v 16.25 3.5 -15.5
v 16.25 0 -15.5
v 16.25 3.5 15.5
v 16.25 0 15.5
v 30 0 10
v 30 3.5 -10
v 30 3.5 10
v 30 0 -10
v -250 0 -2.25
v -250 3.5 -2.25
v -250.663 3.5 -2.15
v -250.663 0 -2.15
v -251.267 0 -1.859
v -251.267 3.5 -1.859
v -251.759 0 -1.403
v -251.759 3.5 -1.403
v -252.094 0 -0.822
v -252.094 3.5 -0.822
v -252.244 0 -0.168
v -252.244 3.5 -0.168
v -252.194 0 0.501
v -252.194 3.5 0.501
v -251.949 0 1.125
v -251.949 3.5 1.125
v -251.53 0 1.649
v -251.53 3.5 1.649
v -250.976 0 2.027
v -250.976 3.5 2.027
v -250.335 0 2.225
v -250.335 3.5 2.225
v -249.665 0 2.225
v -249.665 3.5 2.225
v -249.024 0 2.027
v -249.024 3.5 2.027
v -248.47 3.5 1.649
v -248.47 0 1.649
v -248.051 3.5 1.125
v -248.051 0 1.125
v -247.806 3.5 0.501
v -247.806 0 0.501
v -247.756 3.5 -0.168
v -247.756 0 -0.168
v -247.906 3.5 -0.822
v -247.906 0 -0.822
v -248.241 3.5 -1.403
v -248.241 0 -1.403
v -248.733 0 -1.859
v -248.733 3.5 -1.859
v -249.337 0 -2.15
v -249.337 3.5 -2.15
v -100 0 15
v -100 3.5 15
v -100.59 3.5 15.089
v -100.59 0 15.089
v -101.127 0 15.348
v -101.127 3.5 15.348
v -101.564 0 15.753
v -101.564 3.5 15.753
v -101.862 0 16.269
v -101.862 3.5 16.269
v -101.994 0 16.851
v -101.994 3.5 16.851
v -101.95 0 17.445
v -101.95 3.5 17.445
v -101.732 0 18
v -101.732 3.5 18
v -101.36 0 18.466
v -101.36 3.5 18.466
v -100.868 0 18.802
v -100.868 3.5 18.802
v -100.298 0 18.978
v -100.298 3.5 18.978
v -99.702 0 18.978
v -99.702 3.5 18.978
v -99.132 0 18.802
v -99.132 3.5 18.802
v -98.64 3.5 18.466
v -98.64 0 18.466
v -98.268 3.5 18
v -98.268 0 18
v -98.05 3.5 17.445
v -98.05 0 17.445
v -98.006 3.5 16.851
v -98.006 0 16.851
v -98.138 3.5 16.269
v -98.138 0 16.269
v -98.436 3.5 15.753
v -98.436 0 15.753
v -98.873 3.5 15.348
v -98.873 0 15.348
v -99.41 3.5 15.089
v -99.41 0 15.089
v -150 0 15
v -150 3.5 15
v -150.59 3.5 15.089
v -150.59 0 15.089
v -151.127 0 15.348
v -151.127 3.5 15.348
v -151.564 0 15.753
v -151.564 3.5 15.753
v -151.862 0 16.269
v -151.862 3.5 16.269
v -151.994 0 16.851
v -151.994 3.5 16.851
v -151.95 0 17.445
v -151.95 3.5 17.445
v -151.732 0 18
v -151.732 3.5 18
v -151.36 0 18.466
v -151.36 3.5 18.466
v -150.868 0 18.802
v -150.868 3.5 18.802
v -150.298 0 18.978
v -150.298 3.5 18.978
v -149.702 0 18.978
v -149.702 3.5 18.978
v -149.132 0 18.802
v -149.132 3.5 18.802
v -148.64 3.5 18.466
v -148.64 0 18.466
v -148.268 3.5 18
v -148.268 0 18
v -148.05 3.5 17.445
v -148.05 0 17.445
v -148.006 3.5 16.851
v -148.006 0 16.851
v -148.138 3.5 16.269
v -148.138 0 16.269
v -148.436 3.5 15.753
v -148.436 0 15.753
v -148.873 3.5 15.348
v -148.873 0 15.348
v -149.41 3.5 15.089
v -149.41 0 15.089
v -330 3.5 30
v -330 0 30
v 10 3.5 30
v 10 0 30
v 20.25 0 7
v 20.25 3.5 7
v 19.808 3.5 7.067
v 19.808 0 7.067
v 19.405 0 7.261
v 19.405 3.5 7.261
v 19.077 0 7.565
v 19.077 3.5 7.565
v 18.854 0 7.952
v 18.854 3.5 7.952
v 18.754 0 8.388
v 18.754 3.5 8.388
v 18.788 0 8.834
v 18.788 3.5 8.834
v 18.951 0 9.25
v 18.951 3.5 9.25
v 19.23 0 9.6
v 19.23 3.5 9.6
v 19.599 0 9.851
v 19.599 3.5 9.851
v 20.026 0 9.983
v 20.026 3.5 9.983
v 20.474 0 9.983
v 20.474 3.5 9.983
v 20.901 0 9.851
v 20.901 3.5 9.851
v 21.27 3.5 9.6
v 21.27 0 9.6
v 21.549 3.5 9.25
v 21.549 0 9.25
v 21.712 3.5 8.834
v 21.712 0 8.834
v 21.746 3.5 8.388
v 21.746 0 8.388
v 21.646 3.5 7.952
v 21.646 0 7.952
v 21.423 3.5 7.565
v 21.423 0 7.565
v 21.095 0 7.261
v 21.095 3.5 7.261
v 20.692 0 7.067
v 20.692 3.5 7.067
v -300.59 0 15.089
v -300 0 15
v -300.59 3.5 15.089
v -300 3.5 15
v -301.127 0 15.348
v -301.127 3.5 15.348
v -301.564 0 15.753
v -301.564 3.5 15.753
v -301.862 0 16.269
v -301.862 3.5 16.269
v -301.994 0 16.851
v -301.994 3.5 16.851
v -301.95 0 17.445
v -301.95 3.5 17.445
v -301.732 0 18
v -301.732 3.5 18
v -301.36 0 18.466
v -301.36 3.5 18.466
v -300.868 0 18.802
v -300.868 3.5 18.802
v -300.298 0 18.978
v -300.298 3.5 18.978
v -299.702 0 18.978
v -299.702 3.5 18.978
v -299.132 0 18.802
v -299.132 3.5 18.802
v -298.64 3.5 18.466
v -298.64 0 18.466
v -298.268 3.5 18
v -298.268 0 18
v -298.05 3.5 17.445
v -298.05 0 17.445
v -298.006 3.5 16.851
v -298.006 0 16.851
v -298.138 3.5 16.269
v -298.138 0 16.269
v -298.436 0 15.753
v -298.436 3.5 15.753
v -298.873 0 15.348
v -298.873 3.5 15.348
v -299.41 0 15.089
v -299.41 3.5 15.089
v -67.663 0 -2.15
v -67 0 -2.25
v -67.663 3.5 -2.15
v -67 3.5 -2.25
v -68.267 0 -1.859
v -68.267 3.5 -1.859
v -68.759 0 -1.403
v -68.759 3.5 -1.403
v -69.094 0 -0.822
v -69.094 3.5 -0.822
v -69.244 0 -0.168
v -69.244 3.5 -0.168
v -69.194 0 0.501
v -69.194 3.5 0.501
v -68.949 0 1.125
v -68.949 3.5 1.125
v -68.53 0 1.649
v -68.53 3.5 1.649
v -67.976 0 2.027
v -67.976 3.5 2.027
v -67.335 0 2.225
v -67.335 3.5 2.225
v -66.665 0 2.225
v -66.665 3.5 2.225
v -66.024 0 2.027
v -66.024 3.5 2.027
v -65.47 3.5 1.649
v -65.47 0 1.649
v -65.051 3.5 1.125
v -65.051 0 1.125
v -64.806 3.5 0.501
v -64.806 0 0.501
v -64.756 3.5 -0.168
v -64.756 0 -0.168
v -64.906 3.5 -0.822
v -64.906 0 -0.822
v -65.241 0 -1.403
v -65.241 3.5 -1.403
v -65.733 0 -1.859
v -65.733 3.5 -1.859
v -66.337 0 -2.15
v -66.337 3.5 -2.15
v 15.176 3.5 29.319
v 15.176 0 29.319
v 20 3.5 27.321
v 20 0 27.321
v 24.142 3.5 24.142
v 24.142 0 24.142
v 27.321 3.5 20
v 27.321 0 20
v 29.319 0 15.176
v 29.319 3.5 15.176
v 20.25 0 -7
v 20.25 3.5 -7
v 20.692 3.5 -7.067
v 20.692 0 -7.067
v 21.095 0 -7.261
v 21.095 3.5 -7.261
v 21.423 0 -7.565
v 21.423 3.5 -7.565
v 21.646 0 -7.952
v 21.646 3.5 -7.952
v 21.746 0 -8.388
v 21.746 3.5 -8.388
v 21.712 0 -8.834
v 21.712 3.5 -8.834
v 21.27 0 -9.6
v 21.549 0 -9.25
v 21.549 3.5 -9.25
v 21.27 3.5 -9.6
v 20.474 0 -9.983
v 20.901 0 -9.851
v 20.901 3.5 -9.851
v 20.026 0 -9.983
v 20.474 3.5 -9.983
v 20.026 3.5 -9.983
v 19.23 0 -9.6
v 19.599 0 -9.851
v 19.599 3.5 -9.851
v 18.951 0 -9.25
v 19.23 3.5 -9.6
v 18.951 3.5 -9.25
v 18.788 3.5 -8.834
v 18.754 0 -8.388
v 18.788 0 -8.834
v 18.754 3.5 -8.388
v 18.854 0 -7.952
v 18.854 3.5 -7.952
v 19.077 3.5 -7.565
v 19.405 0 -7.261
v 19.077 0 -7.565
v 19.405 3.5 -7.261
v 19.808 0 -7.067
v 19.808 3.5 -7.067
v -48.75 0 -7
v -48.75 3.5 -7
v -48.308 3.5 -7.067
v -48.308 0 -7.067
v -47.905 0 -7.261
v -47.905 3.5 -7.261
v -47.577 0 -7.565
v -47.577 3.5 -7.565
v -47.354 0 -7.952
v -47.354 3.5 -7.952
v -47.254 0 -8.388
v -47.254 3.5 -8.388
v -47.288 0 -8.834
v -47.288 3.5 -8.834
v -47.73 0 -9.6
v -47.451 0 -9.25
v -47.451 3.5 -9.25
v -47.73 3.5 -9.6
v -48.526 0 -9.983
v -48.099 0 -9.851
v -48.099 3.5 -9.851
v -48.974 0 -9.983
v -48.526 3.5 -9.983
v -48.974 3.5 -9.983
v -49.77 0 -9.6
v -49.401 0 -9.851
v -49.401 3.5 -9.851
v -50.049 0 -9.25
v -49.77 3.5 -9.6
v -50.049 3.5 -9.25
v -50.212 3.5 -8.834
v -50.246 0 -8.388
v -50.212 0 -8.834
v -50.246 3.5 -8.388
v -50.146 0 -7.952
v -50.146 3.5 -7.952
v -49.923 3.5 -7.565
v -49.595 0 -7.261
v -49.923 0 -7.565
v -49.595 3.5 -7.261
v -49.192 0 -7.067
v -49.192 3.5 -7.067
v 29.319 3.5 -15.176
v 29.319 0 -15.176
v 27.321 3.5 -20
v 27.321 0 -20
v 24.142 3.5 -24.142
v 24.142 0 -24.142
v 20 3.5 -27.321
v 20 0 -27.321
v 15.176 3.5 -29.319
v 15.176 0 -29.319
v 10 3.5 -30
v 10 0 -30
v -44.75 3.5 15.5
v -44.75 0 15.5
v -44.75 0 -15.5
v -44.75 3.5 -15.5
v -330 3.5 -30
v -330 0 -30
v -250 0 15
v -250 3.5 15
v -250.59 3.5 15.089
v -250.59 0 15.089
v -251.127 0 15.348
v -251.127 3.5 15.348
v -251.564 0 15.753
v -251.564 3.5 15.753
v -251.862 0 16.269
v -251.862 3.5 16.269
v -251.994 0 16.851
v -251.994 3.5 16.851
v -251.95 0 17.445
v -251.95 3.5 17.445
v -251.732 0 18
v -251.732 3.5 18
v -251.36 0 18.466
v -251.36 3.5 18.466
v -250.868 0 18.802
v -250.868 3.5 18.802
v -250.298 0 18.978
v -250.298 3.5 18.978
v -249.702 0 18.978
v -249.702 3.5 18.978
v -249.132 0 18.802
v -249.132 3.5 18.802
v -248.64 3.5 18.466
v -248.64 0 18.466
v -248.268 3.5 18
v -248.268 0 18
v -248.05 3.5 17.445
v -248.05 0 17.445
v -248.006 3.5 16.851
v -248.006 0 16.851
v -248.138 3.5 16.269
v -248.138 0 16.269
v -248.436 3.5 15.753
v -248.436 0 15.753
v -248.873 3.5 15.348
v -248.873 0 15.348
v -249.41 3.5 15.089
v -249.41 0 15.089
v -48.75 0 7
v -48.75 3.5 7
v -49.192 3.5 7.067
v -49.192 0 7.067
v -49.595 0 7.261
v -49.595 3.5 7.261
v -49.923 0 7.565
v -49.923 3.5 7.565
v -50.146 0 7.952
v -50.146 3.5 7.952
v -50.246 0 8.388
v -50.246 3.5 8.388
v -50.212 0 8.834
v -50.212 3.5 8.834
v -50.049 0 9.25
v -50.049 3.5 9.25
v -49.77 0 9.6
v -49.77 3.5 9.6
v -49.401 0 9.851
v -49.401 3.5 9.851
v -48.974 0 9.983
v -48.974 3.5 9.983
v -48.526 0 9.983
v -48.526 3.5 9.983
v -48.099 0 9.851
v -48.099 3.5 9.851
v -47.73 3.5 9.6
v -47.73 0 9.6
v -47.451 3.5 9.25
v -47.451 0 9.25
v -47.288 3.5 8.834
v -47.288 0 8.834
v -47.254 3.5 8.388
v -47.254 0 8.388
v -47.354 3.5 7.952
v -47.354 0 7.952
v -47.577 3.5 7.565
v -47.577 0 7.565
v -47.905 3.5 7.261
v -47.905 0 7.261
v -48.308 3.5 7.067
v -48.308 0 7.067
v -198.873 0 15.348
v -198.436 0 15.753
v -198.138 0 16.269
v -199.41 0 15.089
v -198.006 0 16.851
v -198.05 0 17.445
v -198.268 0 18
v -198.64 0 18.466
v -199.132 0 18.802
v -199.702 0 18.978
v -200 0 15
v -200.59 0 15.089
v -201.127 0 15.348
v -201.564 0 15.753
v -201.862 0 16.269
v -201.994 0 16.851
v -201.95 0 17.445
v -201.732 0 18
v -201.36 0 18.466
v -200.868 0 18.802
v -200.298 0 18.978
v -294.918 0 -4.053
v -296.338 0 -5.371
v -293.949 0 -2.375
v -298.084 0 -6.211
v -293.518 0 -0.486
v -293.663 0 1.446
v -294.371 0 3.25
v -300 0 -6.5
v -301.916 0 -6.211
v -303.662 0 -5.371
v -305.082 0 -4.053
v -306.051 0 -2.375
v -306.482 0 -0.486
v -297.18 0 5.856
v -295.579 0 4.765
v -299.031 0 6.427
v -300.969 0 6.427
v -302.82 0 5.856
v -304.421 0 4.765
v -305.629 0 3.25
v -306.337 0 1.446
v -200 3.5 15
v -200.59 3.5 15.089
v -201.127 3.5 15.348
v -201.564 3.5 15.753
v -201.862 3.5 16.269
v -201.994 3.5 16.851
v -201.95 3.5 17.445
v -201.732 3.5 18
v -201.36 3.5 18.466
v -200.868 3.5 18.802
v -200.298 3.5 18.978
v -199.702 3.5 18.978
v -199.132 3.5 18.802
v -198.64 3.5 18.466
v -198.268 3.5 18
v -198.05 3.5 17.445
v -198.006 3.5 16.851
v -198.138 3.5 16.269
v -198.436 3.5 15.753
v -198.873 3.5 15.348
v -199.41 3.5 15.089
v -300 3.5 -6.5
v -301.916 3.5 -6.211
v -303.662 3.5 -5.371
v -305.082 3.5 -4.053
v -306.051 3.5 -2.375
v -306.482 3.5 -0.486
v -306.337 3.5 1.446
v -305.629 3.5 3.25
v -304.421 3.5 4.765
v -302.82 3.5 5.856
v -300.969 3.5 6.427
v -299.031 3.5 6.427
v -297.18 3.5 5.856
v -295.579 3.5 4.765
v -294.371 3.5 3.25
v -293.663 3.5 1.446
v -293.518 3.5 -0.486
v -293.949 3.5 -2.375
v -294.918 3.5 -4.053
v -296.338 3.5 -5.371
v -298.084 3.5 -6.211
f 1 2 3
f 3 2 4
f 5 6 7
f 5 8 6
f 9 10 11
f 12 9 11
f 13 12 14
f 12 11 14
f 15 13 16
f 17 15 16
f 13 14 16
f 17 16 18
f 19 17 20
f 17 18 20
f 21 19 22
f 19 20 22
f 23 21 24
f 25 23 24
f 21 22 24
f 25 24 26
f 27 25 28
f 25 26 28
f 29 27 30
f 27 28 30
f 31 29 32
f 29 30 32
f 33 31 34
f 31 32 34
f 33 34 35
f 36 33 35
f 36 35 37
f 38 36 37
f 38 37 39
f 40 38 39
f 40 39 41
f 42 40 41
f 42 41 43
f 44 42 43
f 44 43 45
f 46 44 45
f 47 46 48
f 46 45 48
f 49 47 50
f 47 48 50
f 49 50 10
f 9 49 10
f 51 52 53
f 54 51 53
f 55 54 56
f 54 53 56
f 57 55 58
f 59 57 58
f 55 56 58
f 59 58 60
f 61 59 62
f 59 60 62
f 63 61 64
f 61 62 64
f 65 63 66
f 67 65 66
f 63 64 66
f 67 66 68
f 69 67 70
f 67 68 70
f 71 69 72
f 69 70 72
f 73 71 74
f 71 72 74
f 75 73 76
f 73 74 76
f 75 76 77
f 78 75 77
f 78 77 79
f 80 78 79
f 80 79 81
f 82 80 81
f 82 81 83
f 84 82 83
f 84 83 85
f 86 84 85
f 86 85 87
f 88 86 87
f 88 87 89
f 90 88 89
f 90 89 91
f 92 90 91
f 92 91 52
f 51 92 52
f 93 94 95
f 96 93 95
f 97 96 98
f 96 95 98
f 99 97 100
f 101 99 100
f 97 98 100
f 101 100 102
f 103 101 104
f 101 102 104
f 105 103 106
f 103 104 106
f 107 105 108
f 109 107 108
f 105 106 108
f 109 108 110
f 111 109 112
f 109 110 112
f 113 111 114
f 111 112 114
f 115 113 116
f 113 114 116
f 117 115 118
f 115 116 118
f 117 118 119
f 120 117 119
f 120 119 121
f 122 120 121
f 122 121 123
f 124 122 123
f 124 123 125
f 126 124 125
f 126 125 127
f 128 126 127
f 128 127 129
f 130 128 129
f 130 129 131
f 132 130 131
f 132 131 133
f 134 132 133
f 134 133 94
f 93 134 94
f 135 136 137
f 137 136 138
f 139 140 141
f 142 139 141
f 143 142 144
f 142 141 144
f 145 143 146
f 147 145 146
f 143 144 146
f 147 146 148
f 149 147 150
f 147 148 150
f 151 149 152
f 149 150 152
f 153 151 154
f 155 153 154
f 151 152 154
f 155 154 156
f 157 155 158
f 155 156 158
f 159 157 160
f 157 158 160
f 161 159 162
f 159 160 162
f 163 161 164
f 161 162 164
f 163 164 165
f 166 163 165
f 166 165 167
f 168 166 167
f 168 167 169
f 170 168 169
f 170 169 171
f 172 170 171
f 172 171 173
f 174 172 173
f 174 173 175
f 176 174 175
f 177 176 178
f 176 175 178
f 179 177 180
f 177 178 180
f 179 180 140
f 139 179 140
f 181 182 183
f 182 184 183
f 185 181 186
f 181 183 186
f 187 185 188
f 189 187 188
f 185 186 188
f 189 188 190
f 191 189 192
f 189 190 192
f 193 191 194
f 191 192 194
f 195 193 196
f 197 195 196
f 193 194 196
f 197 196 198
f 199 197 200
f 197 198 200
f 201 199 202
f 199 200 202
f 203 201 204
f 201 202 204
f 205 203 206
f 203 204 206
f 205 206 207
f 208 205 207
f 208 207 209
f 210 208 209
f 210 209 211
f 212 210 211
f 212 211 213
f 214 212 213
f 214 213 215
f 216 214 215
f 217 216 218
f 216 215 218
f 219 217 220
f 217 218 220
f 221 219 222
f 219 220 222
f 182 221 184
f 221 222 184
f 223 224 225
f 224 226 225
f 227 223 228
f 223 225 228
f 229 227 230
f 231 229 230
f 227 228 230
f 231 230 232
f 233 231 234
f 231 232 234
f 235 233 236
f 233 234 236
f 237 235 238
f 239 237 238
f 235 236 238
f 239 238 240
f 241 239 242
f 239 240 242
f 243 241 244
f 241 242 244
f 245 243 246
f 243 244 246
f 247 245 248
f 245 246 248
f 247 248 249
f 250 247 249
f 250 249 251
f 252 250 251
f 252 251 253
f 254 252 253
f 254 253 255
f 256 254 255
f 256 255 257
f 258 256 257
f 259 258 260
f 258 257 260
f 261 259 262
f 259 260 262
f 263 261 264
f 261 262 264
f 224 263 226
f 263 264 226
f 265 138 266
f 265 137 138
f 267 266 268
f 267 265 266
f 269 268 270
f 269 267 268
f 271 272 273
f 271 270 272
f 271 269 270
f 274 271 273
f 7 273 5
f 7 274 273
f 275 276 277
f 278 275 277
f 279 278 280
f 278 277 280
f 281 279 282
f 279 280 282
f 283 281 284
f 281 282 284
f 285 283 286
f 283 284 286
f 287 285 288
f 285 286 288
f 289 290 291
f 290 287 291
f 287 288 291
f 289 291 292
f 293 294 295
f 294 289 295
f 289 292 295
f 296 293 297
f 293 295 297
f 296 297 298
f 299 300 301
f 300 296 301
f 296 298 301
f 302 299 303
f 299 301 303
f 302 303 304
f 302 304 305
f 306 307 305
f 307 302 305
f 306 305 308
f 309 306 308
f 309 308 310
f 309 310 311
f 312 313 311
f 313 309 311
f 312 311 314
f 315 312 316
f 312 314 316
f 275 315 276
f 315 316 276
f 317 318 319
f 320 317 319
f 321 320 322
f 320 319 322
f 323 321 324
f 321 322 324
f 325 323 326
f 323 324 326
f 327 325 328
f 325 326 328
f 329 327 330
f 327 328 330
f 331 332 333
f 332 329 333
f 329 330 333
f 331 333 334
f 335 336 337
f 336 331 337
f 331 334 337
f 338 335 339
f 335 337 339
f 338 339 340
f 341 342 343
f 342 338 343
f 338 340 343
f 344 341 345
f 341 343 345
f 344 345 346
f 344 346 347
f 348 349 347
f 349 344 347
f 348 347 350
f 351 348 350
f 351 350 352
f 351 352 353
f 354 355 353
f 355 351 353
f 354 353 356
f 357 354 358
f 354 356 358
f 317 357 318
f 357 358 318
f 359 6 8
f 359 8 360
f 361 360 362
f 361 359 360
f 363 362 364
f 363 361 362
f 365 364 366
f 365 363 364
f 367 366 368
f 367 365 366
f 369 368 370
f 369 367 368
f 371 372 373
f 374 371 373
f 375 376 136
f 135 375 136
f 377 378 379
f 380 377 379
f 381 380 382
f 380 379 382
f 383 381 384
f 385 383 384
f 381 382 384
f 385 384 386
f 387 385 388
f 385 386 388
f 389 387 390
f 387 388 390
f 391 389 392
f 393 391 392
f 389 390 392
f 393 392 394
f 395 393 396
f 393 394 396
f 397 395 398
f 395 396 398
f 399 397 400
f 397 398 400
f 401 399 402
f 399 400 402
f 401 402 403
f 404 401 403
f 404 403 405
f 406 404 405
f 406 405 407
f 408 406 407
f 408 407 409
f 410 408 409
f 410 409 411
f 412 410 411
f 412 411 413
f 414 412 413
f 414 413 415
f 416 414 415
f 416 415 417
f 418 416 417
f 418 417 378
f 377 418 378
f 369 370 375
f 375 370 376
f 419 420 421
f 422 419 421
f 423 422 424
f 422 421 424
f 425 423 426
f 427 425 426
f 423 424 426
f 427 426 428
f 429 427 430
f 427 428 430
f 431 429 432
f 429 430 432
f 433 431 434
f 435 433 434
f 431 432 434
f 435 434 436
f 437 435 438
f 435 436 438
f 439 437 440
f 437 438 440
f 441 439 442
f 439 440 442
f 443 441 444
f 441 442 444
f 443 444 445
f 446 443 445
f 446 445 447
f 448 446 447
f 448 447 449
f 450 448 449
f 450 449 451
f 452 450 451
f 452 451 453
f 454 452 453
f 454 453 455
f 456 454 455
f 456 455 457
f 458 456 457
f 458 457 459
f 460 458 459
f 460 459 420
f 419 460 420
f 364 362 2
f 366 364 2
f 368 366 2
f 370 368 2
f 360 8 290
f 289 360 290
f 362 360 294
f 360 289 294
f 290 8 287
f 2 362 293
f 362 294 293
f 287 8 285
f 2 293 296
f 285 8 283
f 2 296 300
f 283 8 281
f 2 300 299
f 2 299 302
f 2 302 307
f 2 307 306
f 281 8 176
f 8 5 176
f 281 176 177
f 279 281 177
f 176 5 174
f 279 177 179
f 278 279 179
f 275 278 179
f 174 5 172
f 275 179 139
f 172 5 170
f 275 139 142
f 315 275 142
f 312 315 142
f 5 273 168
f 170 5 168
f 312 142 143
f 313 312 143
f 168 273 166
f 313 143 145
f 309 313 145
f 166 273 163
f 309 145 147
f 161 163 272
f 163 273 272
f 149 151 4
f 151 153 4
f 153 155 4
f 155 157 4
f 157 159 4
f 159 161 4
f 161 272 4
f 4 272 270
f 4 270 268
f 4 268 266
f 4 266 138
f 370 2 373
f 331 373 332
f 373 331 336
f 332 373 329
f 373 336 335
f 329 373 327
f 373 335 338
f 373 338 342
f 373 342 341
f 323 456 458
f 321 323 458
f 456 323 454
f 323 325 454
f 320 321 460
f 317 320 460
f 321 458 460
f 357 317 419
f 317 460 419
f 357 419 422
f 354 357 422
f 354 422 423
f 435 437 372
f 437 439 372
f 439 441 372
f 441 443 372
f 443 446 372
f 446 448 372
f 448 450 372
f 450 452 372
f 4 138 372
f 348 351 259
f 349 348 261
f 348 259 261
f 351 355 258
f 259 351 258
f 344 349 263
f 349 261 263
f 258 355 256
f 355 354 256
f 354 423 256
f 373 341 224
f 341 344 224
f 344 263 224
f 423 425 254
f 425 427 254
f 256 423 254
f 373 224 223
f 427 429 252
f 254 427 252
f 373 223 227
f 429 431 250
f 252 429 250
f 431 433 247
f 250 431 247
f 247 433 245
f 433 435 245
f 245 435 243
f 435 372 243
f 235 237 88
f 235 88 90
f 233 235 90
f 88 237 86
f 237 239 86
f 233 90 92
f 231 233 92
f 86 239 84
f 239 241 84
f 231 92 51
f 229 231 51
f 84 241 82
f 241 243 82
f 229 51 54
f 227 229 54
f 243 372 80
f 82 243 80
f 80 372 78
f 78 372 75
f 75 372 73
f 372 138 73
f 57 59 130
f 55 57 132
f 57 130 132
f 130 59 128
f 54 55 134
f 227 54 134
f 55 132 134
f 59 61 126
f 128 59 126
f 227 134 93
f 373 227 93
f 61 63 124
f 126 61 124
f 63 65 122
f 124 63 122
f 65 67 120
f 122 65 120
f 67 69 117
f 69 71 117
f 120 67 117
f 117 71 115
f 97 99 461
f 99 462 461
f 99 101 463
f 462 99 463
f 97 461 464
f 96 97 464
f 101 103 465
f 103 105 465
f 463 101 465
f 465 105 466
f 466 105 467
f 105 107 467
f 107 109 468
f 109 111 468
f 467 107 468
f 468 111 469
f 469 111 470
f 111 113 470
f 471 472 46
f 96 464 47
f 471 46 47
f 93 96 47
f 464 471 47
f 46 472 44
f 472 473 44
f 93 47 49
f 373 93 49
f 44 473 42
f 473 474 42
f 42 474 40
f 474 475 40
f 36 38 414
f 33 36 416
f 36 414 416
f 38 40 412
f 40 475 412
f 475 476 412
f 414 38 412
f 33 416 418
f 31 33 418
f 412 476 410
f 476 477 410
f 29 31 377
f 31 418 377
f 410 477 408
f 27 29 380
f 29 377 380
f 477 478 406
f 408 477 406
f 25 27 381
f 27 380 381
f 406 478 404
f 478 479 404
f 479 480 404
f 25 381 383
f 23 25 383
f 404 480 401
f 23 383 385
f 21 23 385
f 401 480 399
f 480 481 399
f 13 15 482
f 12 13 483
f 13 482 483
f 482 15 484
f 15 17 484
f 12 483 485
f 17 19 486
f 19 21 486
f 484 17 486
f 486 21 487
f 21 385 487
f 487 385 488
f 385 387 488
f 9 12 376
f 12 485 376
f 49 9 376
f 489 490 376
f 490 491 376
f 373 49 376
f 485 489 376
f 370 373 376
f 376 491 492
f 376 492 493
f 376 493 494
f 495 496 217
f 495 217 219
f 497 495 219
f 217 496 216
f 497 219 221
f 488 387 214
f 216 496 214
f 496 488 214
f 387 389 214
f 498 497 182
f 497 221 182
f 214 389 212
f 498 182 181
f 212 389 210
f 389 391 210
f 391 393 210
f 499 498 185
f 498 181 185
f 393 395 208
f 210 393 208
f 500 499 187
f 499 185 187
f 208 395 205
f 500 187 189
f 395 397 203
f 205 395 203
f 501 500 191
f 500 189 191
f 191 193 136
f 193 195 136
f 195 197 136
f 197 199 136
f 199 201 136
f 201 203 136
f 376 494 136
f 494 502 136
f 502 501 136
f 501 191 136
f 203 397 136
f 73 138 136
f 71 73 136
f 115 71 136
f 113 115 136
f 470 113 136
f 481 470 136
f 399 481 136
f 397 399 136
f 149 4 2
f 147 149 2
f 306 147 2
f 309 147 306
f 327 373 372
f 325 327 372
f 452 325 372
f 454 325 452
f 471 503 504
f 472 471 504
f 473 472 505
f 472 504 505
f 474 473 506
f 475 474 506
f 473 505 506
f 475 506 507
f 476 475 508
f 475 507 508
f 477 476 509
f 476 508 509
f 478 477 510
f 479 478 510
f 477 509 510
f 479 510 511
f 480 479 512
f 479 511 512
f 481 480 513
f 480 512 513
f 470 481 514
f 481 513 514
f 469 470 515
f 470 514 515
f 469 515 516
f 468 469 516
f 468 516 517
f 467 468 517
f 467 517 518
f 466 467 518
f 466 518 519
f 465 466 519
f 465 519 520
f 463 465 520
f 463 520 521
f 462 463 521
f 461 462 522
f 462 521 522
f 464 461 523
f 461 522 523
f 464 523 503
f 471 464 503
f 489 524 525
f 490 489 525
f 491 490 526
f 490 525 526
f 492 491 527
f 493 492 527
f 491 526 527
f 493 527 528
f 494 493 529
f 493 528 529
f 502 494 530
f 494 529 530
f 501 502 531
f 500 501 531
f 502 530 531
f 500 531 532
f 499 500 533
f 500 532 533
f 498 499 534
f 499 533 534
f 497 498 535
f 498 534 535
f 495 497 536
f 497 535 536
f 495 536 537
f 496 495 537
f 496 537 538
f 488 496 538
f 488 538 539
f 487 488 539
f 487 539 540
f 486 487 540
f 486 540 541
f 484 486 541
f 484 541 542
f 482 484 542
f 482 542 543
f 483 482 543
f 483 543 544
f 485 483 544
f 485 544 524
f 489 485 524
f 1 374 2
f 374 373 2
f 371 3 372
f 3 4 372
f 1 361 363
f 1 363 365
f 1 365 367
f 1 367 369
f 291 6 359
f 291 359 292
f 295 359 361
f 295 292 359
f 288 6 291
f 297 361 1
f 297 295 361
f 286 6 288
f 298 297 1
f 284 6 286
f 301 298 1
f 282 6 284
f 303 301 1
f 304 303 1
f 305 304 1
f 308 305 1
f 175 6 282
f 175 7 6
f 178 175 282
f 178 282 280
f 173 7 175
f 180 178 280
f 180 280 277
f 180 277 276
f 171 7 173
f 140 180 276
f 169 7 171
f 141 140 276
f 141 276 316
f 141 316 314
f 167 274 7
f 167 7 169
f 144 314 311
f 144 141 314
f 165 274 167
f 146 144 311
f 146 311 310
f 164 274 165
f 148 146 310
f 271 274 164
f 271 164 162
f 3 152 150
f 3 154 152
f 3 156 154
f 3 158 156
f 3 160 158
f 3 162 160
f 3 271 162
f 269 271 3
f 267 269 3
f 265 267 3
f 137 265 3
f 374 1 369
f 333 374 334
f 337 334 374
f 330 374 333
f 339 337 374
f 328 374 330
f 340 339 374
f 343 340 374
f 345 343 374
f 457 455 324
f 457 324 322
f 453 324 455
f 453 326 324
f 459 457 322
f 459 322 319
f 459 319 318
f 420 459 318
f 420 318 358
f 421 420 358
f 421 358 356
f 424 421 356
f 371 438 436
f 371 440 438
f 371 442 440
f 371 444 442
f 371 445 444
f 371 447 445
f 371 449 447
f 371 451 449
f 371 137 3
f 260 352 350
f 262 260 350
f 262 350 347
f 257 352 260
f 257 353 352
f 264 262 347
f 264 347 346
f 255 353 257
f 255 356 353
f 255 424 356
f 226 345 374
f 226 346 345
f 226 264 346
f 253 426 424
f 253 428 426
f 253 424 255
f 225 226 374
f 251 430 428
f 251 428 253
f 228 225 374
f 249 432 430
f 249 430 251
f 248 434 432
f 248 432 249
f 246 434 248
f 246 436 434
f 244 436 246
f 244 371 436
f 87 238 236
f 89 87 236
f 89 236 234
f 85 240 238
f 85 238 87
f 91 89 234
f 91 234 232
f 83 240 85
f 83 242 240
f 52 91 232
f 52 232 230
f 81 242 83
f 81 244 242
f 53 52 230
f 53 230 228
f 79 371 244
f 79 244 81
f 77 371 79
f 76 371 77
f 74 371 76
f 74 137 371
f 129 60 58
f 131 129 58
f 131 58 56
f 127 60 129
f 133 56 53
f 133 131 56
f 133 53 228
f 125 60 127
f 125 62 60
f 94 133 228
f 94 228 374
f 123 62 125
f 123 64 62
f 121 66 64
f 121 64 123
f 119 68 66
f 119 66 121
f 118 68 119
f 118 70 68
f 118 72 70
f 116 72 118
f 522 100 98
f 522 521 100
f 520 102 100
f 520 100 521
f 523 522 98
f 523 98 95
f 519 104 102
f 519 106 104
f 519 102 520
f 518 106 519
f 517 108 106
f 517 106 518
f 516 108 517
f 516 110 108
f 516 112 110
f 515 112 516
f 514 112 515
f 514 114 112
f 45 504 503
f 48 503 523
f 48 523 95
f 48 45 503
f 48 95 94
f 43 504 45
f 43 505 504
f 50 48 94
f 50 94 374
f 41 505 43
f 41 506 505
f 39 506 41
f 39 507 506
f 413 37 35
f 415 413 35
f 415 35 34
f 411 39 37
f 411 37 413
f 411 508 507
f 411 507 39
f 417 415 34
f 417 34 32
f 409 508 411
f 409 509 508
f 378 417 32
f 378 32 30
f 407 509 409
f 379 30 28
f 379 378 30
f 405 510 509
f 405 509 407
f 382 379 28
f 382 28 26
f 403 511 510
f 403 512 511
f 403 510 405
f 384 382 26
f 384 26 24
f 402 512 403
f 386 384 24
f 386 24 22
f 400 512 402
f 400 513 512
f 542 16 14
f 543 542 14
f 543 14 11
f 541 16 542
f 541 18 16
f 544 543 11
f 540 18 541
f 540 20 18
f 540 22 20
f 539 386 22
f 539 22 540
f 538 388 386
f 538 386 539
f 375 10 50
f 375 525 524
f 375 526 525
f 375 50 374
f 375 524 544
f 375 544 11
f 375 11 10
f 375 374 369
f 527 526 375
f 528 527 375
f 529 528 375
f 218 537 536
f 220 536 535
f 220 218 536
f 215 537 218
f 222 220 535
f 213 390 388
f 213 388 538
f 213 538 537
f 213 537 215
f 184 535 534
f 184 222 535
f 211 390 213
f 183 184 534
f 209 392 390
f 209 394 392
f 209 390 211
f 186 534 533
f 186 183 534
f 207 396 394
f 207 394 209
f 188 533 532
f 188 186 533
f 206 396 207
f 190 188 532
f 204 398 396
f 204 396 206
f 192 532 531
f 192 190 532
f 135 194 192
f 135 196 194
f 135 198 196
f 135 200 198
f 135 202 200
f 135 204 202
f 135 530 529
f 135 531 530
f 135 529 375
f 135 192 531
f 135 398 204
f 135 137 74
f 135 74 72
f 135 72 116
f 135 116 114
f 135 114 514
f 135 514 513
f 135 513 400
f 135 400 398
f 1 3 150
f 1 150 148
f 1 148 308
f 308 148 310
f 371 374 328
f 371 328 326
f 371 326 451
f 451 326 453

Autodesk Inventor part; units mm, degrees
ref_plane "YZ Plane" through (0, 0, 0) normal (1, 0, 0) x (0, 1, 0)
ref_plane "XZ Plane" through (0, 0, 0) normal (0, 1, 0) x (-1, 0, 0)
ref_plane "XY Plane" through (0, 0, 0) normal (0, 0, 1) x (1, 0, 0)
sketch "Sketch1" plane through (0, 0, 0) normal (0, 1, 0) x (-1, 0, 0)
  line L0 (0, 0) -> (-16.25, 0)
  line L1 (0, 0) -> (44.75, 0)
  line L2 (300, 0) -> (330, 0)
  line L3 (330, 30) -> (-30, 30)
  line L4 (-16.25, 15.5) -> (44.75, 15.5)
  line L5 (44.75, 15.5) -> (44.75, 0)
  line L6 (44.75, -15.5) -> (-16.25, -15.5)
  line L7 (-16.25, -15.5) -> (-16.25, 0)
  line L8 (-16.25, 15.5) -> (44.75, -15.5) construction
  line L9 (44.75, 15.5) -> (-16.25, -15.5) construction
  line L10 (-20.25, 8.5) -> (48.75, 8.5) construction
  line L11 (48.75, 8.5) -> (48.75, -8.5) construction
  line L12 (48.75, -8.5) -> (-20.25, -8.5) construction
  line L13 (-20.25, -8.5) -> (-20.25, 8.5) construction
  line L14 (-20.25, 8.5) -> (48.75, -8.5) construction
  line L15 (48.75, 8.5) -> (-20.25, -8.5) construction
  line L16 (-30, 0) -> (-30, 30)
  line L17 (330, 0) -> (330, 30)
  line L18 (44.75, 0) -> (300, 0)
  line L19 (44.75, 0) -> (44.75, -15.5)
  line L20 (-16.25, 0) -> (-30, 0)
  line L21 (-16.25, 0) -> (-16.25, 15.5)
  line L22 (300, 0) -> (300, 17) construction
  line L23 (0, 0) -> (-30, 0) construction
  point P0 (14.25, 0)
  point P1 (14.25, 0)
  point P2 (289, 0)
  point P3 (67, 0)
  point P4 (250, 0)
  dimension "d0" = 300
  dimension "d5" = 61
  dimension "d6" = 31
  dimension "d7" = 69
  dimension "d8" = 17
  dimension "d9" = 16.25
  dimension "d10" = 30
  dimension "d11" = 30
  dimension "d20" = 17
  dimension "d21" = 11
  dimension "d46" = 97
  dimension "d47" = 80
extrude "Extrusion1" add sketch "Sketch1" along normal blind 3.5 contours L20 L16 L3 L17 L2 L18 L5 L4 L21
hole "Hole1" at (20.25, 0, 8.5) at (-48.75, 0, 8.5) direction (0, 1, 0) diameter 3 end through all
hole "Hole2" [suppressed]
fillet "Fillet1" radius 20 1 edges at (30, 1.75, 30)
mirror "Mirror1" about plane through (-44.75, 0, 0) normal (0, 0, -1)
hole "Hole3" at (-300, 0, 0) direction (0, 1, 0) diameter 13 end through all
hole "Hole4" at (-300, 0, 17) direction (0, 1, 0) diameter 4 end through all
pattern_linear "Rectangular Pattern1" count 5 spacing 50 along (1, 0, 0) of "Hole4"
hole "Hole5" at (-67, 0, 0) at (-250, 0, 0) direction (0, 1, 0) diameter 4.5 end through all
properties part number "segment1a" material "Plywood, Finish"
